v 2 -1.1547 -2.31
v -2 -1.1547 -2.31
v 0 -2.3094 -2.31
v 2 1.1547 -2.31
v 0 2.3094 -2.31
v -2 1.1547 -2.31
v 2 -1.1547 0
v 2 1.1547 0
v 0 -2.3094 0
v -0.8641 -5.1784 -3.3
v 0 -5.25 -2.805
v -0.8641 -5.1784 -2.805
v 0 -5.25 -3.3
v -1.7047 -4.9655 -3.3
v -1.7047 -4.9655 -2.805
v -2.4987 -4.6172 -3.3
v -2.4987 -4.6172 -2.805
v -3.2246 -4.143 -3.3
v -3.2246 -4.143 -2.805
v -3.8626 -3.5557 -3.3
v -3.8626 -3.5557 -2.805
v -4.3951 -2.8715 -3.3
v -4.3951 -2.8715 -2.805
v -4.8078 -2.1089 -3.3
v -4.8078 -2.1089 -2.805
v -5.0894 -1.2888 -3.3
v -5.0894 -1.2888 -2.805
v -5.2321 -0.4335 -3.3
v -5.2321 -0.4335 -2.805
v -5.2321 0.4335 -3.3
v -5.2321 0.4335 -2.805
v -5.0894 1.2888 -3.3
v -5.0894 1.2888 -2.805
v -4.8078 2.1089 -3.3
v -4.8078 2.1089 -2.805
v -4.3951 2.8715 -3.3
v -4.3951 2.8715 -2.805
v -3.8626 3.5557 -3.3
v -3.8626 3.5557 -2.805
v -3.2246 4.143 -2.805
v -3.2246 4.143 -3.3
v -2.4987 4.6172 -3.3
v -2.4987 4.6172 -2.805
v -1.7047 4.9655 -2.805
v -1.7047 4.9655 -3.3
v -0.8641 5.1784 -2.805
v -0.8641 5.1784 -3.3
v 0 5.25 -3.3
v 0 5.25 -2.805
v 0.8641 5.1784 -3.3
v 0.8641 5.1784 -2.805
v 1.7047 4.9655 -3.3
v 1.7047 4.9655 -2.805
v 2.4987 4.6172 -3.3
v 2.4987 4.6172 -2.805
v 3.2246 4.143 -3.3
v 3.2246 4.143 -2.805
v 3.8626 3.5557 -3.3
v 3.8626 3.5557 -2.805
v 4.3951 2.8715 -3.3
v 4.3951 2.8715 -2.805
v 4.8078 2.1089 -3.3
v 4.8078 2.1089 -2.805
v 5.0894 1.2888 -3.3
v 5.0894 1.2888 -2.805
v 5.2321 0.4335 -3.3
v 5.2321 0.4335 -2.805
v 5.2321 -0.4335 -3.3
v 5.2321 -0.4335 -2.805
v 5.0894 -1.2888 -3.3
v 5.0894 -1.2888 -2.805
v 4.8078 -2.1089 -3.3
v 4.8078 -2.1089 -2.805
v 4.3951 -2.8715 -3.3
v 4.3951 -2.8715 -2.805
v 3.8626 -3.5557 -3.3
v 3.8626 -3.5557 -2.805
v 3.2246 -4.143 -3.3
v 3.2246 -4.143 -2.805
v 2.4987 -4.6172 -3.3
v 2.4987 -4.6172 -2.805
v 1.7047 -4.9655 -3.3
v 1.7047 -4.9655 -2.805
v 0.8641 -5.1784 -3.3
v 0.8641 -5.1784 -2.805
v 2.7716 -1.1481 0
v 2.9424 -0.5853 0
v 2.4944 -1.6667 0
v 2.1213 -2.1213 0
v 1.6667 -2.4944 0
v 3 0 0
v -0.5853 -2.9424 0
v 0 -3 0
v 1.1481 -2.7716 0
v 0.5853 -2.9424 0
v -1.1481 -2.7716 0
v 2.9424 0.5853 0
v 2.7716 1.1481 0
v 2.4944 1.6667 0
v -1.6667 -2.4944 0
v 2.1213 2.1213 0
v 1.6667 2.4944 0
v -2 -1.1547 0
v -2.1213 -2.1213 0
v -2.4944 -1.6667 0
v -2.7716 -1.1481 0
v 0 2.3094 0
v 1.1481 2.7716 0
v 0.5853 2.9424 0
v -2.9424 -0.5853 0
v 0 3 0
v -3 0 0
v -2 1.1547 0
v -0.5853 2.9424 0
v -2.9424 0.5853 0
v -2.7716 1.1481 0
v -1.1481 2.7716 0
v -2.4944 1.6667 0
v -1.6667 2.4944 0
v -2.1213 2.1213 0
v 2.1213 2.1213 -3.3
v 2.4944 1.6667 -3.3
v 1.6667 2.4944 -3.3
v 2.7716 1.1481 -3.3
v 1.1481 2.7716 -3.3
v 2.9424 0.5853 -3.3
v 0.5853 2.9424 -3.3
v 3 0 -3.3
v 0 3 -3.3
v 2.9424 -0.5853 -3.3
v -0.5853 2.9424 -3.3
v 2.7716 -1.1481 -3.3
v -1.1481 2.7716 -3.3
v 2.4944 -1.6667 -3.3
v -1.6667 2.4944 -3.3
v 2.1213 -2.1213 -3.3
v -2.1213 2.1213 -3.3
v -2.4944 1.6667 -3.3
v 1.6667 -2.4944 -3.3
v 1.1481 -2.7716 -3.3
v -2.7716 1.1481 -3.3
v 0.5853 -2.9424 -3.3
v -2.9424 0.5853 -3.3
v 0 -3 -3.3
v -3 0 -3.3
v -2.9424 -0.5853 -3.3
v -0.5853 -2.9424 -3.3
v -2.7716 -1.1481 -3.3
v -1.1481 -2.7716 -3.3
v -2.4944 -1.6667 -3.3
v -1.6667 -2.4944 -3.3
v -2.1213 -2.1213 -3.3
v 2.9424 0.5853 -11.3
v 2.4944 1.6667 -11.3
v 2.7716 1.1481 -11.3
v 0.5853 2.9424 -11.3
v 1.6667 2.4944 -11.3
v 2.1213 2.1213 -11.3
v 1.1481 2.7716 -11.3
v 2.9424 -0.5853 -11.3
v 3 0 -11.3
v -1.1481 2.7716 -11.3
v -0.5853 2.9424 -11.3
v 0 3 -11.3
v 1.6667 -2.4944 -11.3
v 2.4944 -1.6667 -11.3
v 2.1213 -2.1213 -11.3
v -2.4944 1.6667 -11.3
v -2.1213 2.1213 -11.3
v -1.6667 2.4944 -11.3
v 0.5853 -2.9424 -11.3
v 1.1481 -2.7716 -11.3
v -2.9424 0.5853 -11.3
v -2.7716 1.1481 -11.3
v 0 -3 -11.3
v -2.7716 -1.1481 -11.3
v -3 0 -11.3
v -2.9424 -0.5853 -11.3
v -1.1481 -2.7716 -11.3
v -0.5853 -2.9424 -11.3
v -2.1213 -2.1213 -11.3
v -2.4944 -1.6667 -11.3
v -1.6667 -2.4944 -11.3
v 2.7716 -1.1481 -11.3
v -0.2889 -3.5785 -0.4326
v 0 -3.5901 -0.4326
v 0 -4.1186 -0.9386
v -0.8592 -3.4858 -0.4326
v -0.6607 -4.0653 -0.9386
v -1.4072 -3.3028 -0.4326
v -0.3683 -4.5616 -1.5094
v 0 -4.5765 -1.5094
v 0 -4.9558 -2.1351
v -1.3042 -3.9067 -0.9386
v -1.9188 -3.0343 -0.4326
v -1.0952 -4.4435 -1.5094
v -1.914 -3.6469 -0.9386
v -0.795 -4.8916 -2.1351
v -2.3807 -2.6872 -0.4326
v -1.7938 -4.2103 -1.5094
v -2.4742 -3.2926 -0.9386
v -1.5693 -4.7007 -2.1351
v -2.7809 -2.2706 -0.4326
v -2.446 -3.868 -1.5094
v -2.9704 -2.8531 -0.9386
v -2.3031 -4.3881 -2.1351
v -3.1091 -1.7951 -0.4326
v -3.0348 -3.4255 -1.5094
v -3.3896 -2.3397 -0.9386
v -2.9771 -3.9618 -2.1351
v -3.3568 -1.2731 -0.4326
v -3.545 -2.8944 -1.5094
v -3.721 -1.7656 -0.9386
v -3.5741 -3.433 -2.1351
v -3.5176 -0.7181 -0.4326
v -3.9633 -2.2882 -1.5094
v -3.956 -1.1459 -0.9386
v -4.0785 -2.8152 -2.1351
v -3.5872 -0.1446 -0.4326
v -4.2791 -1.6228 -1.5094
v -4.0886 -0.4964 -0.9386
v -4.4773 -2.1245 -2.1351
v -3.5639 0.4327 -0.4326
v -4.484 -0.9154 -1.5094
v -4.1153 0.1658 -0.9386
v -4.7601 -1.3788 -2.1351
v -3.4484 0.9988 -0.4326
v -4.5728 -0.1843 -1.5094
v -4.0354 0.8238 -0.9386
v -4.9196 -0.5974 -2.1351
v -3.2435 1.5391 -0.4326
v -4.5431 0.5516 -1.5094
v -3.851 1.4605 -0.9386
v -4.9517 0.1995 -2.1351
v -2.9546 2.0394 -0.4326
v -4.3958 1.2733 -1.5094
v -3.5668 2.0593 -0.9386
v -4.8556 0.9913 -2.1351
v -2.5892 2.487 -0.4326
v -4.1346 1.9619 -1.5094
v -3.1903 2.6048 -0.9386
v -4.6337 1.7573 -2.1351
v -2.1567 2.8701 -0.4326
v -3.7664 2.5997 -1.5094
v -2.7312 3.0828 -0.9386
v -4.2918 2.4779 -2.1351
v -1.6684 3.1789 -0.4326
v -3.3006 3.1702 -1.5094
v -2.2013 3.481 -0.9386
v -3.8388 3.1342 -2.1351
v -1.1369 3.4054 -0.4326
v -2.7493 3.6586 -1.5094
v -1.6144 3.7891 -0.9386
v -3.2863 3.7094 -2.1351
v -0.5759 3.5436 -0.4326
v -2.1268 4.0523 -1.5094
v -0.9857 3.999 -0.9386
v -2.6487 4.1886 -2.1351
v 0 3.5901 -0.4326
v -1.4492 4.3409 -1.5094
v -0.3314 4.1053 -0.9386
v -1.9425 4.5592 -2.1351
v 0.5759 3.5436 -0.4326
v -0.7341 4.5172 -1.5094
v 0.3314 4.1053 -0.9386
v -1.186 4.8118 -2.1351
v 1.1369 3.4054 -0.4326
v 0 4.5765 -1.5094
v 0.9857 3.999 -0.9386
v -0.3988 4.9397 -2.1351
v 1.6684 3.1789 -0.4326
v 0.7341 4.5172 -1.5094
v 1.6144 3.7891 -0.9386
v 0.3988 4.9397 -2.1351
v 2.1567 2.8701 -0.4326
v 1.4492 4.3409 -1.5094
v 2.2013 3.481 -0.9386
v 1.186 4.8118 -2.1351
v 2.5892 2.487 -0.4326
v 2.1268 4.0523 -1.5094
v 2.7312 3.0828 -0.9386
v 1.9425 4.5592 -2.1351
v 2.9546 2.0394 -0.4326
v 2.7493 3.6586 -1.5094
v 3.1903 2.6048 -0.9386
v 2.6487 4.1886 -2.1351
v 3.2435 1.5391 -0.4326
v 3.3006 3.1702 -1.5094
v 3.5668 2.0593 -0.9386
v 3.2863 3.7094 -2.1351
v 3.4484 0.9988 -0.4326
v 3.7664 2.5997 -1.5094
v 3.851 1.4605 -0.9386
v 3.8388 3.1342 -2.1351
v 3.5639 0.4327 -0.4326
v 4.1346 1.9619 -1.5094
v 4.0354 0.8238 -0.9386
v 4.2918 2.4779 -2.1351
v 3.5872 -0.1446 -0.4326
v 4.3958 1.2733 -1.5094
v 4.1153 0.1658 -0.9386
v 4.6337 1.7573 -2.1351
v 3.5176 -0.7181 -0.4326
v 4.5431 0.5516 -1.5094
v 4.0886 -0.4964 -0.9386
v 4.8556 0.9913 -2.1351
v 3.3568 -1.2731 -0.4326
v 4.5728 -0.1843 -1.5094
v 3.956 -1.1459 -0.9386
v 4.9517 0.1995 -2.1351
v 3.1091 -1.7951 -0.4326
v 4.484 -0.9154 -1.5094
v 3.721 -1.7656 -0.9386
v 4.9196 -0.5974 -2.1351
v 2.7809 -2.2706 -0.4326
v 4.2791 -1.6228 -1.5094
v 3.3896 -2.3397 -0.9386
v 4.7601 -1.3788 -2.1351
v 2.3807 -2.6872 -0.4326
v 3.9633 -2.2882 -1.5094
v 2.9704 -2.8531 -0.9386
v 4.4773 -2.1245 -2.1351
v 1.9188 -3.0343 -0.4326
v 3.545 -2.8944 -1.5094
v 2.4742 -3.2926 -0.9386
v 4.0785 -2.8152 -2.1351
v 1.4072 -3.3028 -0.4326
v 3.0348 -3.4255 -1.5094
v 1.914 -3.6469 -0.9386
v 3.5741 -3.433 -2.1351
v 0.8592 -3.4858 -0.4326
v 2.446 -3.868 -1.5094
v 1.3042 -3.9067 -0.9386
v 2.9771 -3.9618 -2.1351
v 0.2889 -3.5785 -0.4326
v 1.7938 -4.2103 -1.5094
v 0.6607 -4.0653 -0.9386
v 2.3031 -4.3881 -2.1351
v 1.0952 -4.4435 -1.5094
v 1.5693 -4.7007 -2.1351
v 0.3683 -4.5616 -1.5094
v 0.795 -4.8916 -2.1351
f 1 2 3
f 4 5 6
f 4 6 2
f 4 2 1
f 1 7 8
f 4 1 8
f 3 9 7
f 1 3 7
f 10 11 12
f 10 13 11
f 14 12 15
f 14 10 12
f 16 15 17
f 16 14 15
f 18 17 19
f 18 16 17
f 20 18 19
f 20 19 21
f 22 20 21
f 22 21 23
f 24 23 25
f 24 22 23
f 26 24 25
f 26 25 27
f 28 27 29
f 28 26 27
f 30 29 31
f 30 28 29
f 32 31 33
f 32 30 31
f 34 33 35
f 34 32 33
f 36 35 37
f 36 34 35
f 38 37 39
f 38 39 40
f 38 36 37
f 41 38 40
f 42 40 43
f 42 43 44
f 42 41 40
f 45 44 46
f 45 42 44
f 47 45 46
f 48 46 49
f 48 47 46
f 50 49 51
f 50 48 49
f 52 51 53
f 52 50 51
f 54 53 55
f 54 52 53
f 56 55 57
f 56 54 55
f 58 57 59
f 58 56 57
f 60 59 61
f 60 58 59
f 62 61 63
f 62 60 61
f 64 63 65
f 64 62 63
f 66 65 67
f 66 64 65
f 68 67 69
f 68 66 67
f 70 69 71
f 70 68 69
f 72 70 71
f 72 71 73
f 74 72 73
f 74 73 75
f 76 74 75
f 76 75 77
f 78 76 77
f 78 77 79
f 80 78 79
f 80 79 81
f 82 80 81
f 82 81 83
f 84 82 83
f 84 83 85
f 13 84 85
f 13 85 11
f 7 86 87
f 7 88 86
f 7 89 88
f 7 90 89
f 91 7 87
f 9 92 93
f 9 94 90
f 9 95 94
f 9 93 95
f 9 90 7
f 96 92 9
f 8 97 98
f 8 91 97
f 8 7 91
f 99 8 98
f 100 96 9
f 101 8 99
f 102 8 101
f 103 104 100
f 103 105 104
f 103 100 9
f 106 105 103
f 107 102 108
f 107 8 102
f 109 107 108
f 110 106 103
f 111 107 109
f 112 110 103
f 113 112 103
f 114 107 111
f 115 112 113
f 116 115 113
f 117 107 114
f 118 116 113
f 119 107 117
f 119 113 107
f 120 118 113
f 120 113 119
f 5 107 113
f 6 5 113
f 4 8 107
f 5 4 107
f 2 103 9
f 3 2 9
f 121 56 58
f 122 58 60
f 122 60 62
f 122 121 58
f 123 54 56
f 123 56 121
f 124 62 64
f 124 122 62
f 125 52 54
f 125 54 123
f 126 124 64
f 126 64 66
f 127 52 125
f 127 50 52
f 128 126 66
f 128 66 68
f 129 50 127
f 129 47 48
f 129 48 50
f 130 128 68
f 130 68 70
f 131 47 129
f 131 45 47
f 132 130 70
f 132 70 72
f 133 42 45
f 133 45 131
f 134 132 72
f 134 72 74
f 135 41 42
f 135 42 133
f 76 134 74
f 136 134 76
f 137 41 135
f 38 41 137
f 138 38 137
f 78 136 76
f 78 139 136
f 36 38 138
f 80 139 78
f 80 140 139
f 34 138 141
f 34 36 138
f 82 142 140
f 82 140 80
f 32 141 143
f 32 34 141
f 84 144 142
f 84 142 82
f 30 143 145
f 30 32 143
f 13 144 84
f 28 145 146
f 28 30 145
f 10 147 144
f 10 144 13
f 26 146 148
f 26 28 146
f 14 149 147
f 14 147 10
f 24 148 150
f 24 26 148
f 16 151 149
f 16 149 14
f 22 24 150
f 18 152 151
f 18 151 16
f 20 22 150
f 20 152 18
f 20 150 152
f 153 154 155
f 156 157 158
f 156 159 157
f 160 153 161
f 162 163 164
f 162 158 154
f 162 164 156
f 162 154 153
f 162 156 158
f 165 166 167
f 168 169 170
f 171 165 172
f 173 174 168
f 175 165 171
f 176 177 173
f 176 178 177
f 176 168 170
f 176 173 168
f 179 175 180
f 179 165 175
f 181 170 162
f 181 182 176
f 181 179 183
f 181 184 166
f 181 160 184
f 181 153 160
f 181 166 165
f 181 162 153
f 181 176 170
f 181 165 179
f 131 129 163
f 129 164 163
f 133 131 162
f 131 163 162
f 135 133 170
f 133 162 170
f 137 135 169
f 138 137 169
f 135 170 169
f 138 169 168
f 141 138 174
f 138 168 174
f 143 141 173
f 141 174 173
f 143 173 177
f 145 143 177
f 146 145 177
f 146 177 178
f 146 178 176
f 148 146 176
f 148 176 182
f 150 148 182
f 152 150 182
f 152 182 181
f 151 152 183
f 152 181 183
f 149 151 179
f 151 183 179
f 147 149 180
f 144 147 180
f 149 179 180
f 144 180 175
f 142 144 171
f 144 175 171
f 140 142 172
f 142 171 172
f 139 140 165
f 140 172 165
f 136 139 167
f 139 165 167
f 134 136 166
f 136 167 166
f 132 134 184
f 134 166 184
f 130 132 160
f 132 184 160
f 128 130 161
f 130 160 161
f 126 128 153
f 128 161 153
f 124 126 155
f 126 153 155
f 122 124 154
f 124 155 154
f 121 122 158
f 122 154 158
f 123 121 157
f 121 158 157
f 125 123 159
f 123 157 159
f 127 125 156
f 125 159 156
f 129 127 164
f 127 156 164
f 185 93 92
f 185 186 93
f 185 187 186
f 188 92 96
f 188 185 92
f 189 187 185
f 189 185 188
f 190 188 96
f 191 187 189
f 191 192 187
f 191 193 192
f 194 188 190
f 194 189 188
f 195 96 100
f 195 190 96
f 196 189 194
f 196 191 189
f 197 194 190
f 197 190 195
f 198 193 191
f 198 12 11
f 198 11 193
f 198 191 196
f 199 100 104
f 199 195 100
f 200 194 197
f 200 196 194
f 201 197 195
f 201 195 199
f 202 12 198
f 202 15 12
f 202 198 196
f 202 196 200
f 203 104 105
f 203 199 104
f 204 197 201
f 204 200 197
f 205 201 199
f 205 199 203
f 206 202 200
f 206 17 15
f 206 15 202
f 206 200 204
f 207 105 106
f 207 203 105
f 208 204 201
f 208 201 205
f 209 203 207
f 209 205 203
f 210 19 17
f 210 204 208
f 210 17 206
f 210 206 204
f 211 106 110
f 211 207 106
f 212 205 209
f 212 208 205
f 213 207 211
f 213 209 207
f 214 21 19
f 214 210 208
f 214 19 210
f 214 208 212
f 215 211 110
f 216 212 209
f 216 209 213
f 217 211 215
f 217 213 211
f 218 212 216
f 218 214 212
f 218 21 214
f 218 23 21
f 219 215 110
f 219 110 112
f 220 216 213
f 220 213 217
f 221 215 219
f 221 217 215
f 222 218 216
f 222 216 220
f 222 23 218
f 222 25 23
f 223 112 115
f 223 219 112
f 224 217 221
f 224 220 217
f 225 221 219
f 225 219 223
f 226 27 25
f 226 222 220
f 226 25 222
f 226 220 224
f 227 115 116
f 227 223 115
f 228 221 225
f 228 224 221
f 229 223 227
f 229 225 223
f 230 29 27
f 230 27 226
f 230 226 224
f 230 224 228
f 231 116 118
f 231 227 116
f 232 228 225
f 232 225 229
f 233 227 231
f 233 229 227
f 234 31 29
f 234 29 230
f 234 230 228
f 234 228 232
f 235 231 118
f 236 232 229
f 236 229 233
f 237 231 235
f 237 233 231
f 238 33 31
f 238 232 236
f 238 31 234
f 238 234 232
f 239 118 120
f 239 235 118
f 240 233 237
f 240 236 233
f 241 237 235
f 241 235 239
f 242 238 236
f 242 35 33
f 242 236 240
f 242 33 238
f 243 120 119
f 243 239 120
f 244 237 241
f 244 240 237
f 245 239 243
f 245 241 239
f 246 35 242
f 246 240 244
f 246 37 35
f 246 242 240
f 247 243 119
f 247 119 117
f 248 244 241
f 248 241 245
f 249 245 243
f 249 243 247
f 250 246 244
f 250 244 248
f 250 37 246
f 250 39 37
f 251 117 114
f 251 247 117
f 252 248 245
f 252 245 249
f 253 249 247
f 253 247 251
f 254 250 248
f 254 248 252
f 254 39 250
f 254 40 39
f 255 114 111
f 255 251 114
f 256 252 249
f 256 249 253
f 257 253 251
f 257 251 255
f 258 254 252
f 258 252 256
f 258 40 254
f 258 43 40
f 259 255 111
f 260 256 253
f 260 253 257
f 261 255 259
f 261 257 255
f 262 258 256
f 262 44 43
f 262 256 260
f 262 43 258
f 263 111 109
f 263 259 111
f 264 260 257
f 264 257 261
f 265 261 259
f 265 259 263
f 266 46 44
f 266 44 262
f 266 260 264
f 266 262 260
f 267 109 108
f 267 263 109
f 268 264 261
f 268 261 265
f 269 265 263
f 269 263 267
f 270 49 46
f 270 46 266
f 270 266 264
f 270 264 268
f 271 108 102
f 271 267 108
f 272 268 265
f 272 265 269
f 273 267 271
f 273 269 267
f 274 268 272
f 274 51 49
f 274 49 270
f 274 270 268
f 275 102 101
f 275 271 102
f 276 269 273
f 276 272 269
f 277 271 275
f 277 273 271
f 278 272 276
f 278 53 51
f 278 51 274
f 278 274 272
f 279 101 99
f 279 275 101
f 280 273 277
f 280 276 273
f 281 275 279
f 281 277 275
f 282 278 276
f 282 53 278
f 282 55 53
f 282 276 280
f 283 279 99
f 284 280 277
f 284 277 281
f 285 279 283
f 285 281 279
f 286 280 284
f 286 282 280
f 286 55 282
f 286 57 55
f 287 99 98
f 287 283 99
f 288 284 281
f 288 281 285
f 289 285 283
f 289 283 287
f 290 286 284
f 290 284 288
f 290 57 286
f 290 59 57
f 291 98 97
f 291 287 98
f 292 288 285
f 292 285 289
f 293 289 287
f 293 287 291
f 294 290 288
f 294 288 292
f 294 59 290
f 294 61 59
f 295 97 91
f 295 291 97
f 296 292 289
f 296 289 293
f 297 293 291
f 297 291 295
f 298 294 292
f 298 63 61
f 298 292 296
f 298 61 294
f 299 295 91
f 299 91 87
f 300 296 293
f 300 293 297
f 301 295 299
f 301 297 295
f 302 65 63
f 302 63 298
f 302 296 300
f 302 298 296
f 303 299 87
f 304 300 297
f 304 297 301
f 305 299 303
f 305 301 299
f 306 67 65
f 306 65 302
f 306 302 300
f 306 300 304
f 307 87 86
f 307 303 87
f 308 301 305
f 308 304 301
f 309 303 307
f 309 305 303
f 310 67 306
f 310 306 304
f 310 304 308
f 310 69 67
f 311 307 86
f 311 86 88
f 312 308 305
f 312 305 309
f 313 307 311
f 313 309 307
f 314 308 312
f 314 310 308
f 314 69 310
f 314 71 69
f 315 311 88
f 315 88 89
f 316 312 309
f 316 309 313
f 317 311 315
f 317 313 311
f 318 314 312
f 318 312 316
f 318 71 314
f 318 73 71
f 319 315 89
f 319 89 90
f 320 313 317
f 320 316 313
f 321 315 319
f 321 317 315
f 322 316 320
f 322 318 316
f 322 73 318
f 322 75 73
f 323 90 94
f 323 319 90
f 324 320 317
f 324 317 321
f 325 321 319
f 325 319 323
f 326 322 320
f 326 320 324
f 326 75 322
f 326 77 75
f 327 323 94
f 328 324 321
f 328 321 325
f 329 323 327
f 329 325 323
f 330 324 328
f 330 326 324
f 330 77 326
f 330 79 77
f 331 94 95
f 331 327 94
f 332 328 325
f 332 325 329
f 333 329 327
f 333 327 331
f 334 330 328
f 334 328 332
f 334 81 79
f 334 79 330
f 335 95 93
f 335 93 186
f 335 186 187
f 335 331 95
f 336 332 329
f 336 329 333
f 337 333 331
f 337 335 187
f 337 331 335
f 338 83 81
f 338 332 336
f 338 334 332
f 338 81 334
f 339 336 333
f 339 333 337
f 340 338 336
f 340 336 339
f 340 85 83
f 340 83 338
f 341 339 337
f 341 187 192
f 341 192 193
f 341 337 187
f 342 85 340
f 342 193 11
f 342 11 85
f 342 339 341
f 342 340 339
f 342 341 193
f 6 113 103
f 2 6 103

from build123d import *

# Parameters (mm, degrees)
SKETCH1_W          = 8
SKETCH1_H          = 3
CUT_EXTRUDE2_DEPTH = 2.31


with BuildPart() as part:
    # Sketch1 → Revolve1 (revolve)
    with BuildSketch(Plane(origin=(0, 0, 0), x_dir=(0, 0, -1), z_dir=(1, 0, 0))):
        with Locations((7.3, 1.5)):
            Rectangle(SKETCH1_W, SKETCH1_H)
    revolve(axis=Axis((0, 0, -11.3), (0, 0, 1)))

    # Sketch7 → Revolve2 (revolve)
    with BuildSketch(Plane(origin=(0, 0, 0), x_dir=(0, 0, -1), z_dir=(1, 0, 0)), mode=Mode.PRIVATE) as revolve2_sk:
        with BuildLine():
            Line((2.805, 5.25), (3.3, 5.25))
            Line((3.3, 5.25), (3.3, 0))
            Line((3.3, 0), (0, 0))
            Line((0, 0), (0, 3))
            ThreePointArc((0, 3), (1.216479019, 4.356906156), (2.805, 5.25))
        make_face()
    revolve(revolve2_sk.sketch.rotate(Axis((0, 0, 0), (0, 0, -1)), 180), axis=Axis((0, 0, 0), (0, 0, -1)))

    # Sketch5 → Cut-Extrude2 (cut)
    with BuildSketch(Plane.XY):
        Polygon((2, -1.154700538), (2, 1.154700538), (0, 2.309401077), (-2, 1.154700538), (-2, -1.154700538), (0, -2.309401077), align=None)
    extrude(amount=-CUT_EXTRUDE2_DEPTH, mode=Mode.SUBTRACT)


solid = part.part
